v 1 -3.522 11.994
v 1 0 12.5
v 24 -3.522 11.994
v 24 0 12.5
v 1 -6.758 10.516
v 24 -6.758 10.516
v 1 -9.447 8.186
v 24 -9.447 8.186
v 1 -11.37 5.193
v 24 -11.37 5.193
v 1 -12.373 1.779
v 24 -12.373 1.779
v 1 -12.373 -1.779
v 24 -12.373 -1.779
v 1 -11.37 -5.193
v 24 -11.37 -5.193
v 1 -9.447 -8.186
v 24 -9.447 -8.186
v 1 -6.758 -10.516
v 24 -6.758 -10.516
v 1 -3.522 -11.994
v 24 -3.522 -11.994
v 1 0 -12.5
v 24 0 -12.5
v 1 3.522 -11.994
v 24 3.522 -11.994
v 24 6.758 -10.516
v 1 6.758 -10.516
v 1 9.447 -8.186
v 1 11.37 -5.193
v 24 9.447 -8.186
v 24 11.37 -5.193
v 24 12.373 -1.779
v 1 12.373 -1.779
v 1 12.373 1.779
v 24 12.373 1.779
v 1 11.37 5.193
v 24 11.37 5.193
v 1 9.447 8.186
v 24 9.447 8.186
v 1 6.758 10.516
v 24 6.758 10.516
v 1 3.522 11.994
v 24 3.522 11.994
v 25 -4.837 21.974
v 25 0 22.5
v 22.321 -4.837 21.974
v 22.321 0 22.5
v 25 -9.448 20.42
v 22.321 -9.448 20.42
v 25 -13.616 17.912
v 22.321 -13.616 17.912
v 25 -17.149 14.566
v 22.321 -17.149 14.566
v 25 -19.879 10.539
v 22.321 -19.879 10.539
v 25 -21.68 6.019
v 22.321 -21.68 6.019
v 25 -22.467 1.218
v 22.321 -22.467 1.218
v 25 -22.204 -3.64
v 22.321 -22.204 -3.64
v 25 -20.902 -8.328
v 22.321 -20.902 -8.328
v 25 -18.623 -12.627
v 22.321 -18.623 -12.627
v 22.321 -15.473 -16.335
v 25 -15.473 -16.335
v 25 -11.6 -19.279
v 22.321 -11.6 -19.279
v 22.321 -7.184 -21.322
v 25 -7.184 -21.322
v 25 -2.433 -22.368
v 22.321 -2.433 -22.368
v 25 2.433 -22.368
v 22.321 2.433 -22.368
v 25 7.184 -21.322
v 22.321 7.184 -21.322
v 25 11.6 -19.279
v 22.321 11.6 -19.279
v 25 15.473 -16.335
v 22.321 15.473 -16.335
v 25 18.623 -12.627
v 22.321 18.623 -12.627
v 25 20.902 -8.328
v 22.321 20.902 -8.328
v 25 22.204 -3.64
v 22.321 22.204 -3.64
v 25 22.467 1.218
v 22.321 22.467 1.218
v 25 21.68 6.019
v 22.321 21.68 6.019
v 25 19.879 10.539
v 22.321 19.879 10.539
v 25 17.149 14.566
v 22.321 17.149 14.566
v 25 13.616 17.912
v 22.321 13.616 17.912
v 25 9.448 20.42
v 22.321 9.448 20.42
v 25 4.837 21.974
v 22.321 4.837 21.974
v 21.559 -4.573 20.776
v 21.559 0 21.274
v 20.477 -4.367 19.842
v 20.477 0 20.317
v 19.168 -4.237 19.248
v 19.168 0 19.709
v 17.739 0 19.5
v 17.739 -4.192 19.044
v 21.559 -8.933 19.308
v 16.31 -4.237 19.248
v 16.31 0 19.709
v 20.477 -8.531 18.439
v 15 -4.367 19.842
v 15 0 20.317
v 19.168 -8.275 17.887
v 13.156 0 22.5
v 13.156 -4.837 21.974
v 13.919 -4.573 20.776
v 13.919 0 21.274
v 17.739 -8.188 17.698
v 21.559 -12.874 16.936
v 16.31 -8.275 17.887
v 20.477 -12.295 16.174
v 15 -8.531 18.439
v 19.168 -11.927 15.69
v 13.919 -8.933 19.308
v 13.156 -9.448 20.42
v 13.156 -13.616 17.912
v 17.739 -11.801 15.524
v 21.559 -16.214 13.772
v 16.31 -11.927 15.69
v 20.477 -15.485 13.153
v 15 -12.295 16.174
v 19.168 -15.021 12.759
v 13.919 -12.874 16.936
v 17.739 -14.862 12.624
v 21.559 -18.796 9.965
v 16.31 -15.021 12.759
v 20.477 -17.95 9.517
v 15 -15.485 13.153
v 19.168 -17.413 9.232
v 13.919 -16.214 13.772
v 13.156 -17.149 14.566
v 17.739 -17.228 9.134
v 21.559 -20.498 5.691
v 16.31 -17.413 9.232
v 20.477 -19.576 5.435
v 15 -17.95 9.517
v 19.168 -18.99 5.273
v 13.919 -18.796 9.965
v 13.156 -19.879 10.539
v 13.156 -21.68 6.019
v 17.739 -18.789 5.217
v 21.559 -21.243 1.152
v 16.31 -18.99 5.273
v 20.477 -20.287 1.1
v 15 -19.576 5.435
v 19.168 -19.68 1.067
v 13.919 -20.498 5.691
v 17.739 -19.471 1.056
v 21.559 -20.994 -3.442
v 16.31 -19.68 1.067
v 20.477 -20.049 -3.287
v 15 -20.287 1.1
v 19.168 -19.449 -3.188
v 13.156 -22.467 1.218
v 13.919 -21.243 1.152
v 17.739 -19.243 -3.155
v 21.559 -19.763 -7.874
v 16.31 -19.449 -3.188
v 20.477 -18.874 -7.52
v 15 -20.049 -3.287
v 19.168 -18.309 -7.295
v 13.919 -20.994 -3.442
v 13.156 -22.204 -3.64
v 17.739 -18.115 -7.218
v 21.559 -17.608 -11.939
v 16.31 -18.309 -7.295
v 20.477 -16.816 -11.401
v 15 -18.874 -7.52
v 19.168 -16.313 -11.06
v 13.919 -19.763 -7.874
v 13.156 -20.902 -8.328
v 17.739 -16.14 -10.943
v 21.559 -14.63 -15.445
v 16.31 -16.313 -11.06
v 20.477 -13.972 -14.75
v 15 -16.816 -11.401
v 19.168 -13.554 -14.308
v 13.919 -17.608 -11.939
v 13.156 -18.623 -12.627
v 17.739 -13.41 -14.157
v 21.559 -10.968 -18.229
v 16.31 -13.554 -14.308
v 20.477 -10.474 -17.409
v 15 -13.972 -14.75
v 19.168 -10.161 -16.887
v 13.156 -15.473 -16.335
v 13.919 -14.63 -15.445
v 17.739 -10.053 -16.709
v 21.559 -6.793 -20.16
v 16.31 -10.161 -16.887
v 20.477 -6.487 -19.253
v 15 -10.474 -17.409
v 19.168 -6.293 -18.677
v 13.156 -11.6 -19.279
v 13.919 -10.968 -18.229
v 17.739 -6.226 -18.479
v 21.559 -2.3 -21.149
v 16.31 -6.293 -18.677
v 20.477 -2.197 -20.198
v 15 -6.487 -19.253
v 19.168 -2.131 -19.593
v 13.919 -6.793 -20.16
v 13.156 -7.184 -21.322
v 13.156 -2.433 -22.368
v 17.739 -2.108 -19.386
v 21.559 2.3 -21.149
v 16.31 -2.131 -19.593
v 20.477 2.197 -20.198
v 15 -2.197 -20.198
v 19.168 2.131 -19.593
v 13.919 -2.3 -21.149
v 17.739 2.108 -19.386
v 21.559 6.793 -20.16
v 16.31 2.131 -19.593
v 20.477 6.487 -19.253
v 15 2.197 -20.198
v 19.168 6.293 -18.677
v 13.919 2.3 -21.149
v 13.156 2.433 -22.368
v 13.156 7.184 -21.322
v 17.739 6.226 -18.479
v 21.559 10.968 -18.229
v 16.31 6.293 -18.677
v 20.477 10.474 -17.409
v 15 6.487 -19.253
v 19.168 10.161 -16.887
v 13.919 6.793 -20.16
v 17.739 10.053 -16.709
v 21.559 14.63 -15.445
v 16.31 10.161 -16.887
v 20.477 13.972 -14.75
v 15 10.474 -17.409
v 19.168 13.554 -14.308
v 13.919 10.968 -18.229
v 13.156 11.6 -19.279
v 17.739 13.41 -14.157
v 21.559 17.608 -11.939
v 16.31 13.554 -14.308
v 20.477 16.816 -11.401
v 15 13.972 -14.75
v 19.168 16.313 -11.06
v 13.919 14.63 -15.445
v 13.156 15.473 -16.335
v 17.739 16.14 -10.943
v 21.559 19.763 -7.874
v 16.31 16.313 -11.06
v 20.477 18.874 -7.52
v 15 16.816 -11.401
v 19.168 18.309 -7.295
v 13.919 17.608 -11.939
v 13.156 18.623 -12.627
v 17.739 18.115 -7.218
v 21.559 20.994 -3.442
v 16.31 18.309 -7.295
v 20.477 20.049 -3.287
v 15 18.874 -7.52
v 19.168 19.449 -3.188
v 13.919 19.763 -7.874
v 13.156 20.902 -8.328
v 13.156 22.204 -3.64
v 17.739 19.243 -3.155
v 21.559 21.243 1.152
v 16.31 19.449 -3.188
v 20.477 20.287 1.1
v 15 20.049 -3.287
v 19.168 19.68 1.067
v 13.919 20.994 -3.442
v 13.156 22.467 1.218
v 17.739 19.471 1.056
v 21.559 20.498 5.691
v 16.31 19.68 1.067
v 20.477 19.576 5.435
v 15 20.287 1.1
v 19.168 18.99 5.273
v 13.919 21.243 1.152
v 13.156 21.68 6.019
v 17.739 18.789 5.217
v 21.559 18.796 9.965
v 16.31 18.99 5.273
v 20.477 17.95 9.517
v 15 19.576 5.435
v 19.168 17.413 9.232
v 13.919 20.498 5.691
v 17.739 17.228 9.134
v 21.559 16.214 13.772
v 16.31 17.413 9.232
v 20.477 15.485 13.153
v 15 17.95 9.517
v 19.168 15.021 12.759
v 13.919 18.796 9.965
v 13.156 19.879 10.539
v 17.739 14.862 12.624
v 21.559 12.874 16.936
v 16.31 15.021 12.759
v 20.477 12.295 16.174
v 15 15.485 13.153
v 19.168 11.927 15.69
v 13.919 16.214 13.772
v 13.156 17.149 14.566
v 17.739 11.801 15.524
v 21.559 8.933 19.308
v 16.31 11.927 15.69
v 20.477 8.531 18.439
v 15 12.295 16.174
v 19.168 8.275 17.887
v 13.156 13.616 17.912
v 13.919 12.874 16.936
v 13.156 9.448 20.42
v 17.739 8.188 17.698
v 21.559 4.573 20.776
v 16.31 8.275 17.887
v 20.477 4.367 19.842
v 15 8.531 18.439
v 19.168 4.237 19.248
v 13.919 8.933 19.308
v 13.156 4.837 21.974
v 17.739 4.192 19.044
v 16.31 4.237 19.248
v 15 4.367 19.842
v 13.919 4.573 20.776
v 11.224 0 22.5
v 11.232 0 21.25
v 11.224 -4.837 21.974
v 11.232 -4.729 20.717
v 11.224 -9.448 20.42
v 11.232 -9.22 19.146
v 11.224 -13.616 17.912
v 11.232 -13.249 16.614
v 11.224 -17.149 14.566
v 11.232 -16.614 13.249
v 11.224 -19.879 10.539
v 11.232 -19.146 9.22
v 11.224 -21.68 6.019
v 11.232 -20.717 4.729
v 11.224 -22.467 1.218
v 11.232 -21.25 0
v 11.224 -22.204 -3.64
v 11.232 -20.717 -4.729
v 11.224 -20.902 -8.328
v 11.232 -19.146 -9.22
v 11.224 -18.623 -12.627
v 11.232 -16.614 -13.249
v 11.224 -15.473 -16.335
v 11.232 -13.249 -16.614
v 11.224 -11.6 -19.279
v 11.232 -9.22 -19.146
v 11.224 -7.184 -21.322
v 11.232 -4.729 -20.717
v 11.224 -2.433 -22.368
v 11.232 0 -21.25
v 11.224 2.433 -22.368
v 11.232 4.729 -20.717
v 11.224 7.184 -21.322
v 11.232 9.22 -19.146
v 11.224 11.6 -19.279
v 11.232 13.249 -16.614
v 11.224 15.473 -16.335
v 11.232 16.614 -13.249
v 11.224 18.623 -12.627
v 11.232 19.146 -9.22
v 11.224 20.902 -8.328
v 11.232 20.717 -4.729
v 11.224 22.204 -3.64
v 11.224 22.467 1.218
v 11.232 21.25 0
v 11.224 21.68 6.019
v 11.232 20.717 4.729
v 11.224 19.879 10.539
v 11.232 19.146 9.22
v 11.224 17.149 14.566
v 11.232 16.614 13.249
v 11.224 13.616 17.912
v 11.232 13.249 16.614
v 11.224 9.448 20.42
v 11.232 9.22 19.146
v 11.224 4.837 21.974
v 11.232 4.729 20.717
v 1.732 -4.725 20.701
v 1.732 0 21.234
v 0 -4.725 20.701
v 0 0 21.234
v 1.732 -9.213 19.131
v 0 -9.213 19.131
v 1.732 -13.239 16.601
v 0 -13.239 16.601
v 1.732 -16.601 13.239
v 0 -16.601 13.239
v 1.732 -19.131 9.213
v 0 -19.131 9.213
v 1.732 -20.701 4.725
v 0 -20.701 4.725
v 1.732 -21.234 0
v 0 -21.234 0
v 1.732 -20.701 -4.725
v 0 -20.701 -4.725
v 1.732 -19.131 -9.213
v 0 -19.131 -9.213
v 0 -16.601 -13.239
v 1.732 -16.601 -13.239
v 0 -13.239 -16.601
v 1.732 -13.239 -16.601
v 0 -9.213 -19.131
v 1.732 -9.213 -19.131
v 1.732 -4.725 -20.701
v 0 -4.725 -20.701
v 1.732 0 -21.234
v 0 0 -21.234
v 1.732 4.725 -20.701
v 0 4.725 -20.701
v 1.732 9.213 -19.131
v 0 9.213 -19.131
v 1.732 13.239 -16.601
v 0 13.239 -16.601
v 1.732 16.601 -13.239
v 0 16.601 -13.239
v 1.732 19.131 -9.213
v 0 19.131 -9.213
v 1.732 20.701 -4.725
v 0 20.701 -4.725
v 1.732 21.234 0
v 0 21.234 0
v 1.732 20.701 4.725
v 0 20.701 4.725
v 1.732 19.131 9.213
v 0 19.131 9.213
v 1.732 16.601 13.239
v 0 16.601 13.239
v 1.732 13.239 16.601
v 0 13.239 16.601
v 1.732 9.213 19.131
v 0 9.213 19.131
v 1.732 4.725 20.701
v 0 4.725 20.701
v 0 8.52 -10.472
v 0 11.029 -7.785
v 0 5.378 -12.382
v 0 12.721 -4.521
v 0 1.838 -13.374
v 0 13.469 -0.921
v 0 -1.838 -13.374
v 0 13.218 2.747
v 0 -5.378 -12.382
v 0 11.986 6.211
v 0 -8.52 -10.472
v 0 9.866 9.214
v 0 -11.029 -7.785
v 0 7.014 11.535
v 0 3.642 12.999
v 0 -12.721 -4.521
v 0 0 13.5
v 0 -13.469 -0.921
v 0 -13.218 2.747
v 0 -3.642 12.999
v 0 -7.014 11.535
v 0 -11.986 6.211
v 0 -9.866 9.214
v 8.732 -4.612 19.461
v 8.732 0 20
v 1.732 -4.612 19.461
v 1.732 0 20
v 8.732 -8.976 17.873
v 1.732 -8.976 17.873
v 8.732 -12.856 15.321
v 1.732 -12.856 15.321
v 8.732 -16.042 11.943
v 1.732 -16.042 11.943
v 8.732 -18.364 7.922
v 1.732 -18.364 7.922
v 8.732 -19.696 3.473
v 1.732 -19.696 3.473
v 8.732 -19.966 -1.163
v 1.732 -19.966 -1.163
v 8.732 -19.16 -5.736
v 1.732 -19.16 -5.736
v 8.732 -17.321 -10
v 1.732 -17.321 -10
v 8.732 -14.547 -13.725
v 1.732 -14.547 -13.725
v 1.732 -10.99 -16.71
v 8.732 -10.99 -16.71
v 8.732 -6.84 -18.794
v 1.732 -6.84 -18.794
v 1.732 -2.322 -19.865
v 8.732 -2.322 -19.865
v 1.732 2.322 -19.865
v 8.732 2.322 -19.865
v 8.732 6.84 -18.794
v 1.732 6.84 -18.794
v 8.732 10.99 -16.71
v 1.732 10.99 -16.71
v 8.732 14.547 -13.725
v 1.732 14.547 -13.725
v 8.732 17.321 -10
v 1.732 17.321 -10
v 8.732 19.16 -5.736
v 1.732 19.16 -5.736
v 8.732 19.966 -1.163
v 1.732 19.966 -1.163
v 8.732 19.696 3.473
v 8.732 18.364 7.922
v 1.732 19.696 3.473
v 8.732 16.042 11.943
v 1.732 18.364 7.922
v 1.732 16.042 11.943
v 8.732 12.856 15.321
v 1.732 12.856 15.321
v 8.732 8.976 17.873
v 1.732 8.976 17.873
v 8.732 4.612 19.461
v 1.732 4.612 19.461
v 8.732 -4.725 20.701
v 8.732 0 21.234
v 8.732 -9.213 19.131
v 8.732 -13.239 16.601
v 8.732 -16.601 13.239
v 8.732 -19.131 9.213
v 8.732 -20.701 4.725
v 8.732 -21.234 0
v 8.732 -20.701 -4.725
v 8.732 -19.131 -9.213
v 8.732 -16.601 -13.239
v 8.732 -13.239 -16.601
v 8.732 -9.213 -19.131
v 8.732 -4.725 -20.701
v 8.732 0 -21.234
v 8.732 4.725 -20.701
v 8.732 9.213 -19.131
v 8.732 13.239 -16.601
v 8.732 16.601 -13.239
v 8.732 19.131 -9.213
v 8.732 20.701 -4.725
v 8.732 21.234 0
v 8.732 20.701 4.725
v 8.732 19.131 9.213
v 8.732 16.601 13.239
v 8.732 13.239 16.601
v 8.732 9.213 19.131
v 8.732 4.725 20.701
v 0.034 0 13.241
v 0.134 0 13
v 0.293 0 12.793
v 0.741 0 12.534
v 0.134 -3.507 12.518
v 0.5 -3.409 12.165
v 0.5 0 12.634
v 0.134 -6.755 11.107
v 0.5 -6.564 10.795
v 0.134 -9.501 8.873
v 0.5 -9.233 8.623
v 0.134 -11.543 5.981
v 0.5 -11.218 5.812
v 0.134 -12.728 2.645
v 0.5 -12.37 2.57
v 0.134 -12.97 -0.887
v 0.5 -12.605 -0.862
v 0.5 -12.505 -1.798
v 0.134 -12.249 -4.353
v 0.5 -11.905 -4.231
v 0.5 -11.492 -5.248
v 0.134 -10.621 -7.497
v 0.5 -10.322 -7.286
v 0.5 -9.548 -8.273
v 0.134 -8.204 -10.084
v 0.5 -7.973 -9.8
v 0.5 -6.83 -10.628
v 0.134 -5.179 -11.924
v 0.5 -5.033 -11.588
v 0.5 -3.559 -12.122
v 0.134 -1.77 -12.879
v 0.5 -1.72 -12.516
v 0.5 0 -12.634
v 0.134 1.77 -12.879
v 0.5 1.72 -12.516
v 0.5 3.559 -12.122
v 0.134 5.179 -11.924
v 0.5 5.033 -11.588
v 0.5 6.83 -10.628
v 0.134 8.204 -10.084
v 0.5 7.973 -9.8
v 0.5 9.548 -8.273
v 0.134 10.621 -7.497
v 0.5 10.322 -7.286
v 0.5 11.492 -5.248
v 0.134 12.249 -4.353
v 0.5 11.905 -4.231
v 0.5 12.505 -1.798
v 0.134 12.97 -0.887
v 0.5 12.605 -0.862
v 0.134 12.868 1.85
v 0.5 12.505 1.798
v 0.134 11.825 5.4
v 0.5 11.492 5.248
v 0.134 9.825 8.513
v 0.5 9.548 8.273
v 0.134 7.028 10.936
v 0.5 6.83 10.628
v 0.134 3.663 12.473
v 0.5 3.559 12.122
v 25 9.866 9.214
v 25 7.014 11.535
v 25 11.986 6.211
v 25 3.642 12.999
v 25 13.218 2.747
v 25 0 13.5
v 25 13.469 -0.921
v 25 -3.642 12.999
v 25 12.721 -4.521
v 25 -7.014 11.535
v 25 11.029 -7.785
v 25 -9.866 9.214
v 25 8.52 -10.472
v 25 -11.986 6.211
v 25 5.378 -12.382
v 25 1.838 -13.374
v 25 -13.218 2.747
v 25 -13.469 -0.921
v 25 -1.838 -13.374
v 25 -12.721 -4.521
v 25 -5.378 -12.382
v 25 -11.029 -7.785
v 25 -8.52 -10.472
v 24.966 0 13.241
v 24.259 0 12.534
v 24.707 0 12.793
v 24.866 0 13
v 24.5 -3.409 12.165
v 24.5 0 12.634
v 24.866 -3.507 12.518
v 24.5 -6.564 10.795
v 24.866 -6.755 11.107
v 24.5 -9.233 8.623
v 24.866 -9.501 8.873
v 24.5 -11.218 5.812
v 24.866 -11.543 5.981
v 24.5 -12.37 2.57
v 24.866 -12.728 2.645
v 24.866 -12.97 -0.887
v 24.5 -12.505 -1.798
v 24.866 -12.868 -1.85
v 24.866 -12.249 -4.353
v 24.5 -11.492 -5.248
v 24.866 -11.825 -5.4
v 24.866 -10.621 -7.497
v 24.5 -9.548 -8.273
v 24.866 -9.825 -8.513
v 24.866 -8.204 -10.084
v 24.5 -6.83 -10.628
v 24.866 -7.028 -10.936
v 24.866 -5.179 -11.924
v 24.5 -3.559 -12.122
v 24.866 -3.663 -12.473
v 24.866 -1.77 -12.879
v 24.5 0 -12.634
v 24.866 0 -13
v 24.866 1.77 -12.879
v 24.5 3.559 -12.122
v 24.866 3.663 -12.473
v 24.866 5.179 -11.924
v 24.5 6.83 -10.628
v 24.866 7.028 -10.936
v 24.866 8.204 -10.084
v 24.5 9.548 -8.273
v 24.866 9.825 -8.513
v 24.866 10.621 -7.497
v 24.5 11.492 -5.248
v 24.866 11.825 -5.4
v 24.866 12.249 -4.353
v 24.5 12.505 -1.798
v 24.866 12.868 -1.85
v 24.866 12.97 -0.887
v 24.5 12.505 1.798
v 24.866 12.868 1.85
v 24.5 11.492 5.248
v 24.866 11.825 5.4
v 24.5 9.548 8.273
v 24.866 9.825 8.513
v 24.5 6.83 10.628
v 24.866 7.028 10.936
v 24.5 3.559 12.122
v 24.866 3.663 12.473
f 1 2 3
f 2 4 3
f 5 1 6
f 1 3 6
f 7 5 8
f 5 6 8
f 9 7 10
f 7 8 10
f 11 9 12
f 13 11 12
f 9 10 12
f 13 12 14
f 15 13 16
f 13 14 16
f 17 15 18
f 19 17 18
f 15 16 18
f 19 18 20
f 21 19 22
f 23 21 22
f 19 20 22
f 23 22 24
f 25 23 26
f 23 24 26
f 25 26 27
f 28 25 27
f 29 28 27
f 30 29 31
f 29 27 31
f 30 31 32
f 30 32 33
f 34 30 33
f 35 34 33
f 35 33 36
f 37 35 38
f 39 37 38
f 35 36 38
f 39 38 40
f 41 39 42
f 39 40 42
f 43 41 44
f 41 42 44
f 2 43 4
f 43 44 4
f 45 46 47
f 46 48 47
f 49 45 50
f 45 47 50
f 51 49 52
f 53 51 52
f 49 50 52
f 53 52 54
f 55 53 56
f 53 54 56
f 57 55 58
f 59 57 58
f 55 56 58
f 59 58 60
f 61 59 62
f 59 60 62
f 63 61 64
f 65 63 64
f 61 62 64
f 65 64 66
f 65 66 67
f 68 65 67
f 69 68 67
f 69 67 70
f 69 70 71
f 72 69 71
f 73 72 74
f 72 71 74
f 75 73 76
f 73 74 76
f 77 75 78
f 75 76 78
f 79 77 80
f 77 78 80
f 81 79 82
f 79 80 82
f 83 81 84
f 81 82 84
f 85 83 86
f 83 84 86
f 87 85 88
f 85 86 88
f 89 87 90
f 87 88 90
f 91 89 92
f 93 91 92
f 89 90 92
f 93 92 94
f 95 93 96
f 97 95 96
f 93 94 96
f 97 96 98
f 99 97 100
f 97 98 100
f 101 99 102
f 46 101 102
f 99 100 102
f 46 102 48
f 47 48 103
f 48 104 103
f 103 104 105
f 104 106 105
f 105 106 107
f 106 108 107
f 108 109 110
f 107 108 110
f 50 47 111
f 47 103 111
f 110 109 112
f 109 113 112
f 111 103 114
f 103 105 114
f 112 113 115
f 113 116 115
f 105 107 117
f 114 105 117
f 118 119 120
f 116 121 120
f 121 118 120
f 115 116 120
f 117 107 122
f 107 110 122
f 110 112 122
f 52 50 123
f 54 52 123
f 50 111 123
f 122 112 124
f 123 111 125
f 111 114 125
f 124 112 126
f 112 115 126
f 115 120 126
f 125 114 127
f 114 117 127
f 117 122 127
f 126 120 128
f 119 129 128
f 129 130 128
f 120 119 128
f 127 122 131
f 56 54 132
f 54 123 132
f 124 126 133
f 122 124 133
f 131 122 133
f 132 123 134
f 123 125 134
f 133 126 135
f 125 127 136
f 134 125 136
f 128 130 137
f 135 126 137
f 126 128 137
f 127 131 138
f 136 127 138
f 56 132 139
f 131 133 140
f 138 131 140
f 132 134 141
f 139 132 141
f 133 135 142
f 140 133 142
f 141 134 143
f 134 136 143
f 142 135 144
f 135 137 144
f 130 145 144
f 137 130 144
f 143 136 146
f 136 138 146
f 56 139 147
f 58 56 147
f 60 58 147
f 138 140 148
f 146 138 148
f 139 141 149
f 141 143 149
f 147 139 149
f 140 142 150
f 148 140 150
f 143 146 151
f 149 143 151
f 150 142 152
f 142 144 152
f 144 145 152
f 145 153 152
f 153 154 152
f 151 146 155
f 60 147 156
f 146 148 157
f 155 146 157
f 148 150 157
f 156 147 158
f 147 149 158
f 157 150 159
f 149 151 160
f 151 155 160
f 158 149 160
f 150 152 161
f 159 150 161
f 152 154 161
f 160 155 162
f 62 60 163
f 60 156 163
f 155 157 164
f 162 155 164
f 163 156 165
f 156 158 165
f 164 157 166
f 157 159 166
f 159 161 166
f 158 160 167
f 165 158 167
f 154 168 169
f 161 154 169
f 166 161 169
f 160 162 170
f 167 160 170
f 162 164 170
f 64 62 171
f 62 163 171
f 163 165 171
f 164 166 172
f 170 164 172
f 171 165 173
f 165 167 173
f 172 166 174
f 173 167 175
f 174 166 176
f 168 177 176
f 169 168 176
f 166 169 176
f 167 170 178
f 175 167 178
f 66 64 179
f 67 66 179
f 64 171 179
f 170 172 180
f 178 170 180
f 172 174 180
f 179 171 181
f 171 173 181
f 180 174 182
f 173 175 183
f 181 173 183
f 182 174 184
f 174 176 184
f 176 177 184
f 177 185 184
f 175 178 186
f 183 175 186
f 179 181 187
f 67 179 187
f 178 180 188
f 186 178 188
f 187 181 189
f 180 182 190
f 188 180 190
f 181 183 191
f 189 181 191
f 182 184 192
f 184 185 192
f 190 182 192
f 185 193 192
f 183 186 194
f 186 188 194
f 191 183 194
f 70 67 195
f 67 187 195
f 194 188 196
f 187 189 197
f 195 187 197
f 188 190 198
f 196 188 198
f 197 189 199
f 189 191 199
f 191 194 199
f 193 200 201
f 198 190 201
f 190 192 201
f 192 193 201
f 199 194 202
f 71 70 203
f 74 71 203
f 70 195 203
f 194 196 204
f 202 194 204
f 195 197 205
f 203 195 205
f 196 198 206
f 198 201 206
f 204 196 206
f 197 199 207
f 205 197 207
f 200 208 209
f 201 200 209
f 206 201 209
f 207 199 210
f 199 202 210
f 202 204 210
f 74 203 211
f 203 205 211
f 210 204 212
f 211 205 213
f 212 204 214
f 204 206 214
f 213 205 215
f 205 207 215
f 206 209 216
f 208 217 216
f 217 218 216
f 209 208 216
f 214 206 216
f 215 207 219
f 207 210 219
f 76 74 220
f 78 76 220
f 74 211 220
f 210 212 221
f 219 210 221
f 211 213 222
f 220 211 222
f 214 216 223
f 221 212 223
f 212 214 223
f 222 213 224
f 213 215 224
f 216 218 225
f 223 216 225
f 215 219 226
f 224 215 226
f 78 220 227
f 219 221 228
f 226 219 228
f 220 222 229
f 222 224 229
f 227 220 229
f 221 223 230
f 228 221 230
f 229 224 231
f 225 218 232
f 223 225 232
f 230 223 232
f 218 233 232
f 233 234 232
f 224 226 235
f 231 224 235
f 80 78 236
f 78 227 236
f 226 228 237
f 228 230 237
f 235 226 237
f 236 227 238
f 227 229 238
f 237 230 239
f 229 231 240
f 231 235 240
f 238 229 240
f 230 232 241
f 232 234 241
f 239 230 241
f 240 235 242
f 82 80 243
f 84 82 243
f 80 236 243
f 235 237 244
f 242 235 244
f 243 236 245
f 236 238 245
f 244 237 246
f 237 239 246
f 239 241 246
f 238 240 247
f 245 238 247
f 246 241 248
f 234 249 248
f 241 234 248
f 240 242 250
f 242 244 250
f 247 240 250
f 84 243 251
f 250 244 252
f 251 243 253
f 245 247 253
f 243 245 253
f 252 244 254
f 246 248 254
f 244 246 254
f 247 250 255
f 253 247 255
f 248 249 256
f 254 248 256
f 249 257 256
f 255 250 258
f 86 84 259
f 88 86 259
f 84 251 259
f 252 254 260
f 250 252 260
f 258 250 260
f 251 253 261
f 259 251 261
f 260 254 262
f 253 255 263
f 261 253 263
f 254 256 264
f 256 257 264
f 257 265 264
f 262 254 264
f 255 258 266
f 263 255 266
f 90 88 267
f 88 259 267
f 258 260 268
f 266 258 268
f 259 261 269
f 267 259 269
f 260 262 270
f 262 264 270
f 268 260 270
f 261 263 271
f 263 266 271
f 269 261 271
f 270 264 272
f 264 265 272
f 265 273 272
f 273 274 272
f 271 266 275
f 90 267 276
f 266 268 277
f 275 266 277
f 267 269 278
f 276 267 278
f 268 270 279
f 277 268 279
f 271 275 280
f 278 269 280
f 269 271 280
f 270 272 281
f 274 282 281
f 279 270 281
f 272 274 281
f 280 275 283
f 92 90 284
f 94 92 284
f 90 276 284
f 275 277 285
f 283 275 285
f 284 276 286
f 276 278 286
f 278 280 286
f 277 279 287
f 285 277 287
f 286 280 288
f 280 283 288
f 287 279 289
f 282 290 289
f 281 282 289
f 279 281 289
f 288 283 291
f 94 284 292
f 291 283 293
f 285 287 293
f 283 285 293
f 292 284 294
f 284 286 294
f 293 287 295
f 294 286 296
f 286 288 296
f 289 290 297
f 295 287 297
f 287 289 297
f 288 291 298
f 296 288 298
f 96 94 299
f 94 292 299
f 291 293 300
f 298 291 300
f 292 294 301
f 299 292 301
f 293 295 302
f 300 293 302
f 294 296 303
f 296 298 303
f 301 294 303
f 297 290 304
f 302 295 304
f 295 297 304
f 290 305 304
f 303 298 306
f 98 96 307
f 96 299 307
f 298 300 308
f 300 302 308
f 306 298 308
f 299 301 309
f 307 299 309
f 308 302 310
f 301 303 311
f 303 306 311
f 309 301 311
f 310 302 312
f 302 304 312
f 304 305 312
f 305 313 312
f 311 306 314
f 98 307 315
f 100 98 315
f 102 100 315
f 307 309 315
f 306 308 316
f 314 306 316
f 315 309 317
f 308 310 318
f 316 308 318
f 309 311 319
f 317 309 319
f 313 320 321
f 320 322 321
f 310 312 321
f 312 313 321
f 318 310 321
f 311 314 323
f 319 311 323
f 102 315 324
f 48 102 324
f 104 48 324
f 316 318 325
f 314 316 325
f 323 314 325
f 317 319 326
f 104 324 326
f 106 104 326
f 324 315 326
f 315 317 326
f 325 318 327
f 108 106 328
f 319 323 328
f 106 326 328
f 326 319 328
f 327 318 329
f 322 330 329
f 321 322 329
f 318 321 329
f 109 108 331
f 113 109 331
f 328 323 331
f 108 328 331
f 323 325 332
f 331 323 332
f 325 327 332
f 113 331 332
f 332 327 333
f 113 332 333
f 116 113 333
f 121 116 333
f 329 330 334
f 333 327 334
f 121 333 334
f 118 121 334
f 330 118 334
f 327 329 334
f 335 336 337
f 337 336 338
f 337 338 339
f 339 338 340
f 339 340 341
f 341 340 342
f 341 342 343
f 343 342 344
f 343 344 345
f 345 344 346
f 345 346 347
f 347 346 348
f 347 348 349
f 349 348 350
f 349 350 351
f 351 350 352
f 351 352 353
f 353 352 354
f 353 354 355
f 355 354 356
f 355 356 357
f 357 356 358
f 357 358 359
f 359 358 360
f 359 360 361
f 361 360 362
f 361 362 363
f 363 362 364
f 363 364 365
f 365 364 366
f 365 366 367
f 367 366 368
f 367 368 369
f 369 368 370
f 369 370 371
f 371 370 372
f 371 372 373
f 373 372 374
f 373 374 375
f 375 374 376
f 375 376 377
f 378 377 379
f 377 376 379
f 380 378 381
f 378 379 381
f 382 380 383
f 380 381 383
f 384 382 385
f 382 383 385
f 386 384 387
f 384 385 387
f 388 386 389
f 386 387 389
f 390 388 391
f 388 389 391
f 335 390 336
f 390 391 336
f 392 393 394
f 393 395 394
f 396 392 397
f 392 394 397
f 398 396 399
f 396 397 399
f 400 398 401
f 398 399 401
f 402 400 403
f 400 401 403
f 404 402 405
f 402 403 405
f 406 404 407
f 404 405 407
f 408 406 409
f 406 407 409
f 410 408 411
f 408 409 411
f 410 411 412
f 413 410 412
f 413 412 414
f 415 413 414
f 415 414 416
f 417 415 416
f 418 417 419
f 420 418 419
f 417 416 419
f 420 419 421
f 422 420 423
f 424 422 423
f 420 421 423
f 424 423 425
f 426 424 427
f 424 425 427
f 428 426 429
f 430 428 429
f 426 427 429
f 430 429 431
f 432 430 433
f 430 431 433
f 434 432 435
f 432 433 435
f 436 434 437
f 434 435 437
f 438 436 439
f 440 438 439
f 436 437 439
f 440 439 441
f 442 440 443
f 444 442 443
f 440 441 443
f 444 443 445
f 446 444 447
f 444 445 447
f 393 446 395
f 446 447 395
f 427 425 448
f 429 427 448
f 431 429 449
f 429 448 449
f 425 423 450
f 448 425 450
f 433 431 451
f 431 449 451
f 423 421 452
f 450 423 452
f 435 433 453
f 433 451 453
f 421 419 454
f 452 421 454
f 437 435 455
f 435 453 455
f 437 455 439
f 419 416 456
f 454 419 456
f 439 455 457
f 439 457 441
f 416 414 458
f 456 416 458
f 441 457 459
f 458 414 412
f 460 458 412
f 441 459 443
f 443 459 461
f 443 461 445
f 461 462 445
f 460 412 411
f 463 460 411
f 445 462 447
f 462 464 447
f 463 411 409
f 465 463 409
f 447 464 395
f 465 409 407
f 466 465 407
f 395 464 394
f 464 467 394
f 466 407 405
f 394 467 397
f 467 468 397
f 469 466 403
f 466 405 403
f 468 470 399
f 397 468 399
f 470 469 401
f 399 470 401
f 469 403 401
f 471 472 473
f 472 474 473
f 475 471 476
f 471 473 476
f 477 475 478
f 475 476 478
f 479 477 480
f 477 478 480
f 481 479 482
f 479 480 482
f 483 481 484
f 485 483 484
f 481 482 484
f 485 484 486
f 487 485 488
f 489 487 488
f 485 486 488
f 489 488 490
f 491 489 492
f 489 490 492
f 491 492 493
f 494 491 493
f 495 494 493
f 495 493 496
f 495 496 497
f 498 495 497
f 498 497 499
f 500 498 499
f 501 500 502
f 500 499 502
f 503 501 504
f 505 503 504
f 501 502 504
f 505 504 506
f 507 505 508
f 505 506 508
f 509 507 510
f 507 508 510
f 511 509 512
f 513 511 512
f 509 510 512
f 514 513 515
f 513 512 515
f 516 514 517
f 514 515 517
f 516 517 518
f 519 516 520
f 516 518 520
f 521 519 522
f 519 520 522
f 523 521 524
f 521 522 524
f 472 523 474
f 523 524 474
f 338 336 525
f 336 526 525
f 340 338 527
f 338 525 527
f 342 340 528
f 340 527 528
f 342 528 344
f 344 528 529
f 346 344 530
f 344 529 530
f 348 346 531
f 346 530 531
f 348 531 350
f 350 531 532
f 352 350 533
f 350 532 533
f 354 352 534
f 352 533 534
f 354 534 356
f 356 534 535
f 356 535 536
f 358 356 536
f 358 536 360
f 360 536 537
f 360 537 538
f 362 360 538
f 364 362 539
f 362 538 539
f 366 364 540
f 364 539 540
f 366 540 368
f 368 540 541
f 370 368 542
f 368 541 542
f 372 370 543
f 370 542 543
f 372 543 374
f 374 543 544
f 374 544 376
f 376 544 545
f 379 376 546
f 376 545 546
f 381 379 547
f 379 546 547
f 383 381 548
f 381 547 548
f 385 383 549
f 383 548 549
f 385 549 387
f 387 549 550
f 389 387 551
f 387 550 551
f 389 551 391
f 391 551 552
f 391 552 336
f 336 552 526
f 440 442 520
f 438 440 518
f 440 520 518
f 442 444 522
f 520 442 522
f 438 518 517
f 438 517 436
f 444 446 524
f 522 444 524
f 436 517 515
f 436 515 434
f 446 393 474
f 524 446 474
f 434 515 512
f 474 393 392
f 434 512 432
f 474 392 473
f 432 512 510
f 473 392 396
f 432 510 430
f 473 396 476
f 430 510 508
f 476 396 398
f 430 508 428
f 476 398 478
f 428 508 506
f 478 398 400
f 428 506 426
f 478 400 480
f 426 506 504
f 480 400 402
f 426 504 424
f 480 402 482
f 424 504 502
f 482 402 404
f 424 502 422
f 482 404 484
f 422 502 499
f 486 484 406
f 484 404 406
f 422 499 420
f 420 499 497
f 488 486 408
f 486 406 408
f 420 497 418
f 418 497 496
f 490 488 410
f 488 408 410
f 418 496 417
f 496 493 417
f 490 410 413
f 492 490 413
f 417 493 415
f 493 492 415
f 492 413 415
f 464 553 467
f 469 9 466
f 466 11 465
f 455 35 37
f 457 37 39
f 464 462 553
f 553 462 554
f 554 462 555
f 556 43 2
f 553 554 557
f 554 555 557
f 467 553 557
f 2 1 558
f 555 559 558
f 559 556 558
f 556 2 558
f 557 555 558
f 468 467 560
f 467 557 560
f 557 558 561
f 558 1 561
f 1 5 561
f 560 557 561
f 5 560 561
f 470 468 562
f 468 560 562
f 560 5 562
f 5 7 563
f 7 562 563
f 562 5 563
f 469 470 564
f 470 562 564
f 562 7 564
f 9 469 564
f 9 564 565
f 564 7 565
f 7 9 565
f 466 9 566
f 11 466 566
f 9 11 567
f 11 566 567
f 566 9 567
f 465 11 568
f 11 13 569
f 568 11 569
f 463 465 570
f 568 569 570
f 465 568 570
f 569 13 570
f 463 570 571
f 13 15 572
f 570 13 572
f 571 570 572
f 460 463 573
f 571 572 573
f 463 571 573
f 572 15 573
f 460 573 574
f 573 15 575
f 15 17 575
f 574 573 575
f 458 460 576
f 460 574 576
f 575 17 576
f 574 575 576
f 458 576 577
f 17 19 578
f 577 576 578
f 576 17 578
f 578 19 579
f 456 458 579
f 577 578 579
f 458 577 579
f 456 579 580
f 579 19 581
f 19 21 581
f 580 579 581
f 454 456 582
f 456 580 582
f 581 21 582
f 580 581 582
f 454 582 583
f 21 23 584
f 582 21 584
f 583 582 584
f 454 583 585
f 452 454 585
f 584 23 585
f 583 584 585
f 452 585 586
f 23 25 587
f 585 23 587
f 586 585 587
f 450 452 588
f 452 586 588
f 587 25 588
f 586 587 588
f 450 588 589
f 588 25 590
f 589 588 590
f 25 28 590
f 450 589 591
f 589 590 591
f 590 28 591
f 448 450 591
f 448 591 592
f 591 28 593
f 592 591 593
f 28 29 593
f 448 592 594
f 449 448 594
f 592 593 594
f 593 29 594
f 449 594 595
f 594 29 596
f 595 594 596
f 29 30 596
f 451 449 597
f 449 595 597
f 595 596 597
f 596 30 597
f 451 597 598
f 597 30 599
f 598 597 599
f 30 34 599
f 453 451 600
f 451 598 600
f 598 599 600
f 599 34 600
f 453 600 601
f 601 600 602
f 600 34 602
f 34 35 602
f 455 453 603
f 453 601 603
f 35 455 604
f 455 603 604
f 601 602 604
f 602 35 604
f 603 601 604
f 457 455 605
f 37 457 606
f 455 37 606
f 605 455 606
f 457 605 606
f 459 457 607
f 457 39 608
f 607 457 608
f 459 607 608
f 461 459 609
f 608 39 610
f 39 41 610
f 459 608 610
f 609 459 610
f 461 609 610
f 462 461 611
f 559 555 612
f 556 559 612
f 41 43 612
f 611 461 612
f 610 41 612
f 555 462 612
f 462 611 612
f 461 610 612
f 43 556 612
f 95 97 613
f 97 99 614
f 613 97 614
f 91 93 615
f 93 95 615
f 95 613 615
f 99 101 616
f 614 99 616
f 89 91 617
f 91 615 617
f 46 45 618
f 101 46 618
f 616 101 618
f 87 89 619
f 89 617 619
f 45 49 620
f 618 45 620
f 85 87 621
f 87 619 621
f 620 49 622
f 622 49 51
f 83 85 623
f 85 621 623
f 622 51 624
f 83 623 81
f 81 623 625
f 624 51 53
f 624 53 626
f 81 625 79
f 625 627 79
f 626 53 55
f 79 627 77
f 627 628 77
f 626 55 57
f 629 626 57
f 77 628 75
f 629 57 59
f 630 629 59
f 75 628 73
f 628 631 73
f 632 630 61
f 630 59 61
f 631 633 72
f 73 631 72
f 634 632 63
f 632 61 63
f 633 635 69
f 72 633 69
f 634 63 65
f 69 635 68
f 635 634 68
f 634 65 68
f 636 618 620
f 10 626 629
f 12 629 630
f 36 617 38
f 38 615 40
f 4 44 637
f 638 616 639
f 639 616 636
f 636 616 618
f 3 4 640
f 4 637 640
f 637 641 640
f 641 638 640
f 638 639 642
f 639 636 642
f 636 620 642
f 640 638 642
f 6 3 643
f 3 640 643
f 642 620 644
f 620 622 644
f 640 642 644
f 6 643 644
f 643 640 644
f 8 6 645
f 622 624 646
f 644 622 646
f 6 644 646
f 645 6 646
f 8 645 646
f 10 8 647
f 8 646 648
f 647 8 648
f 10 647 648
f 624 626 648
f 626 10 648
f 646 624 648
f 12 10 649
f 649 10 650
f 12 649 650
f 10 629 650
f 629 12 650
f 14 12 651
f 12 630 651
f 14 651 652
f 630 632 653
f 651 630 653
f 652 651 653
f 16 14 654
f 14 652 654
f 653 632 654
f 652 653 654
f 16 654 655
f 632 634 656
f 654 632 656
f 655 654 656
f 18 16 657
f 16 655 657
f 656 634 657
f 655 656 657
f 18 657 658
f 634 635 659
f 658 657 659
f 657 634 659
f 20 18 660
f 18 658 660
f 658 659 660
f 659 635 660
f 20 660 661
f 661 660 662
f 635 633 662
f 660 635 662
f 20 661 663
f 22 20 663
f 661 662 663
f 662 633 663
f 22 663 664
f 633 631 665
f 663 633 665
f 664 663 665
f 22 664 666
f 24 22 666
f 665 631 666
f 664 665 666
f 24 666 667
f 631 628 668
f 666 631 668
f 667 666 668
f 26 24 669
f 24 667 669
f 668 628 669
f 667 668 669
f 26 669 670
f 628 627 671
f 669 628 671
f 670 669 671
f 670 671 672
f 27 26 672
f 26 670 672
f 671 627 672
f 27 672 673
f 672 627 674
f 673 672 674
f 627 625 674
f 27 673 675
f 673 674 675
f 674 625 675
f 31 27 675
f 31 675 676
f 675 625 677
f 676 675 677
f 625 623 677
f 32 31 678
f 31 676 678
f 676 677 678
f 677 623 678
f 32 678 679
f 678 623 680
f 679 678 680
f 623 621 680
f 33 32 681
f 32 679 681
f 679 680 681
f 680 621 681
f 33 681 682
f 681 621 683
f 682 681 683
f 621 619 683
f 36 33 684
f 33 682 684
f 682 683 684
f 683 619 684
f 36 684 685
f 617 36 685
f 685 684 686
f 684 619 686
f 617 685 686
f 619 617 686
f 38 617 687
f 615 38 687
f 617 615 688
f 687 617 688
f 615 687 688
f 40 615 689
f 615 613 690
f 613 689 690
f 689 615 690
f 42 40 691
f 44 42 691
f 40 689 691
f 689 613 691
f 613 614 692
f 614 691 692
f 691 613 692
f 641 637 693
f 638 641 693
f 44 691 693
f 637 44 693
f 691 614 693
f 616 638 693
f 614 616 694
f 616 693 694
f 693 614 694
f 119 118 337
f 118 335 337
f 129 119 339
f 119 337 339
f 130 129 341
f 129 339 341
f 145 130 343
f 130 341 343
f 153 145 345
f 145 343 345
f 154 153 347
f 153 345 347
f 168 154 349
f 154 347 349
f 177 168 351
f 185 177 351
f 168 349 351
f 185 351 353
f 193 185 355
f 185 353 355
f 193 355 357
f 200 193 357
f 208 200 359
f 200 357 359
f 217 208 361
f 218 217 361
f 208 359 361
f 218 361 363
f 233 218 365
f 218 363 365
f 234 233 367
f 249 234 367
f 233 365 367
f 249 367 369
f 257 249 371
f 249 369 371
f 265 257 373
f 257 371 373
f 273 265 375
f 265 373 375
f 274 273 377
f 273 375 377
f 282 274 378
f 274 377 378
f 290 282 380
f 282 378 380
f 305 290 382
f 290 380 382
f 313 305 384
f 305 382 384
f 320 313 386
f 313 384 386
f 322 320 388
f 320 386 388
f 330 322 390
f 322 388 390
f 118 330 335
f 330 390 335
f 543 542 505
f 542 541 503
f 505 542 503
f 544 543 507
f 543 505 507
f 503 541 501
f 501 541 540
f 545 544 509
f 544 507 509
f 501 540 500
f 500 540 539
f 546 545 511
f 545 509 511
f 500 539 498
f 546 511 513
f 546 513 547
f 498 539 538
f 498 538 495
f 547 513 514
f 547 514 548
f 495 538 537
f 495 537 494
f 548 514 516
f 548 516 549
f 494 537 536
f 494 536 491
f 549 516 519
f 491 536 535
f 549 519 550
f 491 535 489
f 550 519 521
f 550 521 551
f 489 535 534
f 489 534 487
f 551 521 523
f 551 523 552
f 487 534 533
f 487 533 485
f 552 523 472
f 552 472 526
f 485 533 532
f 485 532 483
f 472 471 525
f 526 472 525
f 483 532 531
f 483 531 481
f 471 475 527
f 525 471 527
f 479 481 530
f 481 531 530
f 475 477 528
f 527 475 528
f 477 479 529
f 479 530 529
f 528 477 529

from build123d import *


with BuildPart() as part:
    # Esquisse1 → Base-Révolution (revolve)
    with BuildSketch(Plane.XY, mode=Mode.PRIVATE) as base_r_volution_sk:
        with BuildLine():
            Line((1, 12.5), (24, 12.5))
            ThreePointArc((24, 12.5), (24.707106781, 12.792893219), (25, 13.5))
            Line((25, 13.5), (25, 22.5))
            Line((25, 22.5), (22.321383042, 22.499995211))
            ThreePointArc((22.321383042, 22.499995211), (17.738807347, 19.499995211), (13.156231652, 22.499995211))
            Line((13.156231652, 22.499995211), (11.22402651, 22.499995211))
            Line((11.22402651, 22.499995211), (11.232186751, 21.25))
            Line((11.232186751, 21.25), (8.732186751, 21.233679457))
            Line((8.732186751, 21.233679457), (8.732186751, 20))
            Line((8.732186751, 20), (1.732186751, 20))
            Line((1.732186751, 20), (1.732186751, 21.233679457))
            Line((1.732186751, 21.233679457), (0, 21.233679457))
            Line((0, 21.233679457), (0, 20))
            Line((0, 20), (0, 13.5))
            ThreePointArc((0, 13.5), (0.292893219, 12.792893219), (1, 12.5))
        make_face()
    revolve(base_r_volution_sk.sketch.rotate(Axis((0, 0, 0), (1, 0, 0)), 90), axis=Axis((0, 0, 0), (1, 0, 0)))


solid = part.part
